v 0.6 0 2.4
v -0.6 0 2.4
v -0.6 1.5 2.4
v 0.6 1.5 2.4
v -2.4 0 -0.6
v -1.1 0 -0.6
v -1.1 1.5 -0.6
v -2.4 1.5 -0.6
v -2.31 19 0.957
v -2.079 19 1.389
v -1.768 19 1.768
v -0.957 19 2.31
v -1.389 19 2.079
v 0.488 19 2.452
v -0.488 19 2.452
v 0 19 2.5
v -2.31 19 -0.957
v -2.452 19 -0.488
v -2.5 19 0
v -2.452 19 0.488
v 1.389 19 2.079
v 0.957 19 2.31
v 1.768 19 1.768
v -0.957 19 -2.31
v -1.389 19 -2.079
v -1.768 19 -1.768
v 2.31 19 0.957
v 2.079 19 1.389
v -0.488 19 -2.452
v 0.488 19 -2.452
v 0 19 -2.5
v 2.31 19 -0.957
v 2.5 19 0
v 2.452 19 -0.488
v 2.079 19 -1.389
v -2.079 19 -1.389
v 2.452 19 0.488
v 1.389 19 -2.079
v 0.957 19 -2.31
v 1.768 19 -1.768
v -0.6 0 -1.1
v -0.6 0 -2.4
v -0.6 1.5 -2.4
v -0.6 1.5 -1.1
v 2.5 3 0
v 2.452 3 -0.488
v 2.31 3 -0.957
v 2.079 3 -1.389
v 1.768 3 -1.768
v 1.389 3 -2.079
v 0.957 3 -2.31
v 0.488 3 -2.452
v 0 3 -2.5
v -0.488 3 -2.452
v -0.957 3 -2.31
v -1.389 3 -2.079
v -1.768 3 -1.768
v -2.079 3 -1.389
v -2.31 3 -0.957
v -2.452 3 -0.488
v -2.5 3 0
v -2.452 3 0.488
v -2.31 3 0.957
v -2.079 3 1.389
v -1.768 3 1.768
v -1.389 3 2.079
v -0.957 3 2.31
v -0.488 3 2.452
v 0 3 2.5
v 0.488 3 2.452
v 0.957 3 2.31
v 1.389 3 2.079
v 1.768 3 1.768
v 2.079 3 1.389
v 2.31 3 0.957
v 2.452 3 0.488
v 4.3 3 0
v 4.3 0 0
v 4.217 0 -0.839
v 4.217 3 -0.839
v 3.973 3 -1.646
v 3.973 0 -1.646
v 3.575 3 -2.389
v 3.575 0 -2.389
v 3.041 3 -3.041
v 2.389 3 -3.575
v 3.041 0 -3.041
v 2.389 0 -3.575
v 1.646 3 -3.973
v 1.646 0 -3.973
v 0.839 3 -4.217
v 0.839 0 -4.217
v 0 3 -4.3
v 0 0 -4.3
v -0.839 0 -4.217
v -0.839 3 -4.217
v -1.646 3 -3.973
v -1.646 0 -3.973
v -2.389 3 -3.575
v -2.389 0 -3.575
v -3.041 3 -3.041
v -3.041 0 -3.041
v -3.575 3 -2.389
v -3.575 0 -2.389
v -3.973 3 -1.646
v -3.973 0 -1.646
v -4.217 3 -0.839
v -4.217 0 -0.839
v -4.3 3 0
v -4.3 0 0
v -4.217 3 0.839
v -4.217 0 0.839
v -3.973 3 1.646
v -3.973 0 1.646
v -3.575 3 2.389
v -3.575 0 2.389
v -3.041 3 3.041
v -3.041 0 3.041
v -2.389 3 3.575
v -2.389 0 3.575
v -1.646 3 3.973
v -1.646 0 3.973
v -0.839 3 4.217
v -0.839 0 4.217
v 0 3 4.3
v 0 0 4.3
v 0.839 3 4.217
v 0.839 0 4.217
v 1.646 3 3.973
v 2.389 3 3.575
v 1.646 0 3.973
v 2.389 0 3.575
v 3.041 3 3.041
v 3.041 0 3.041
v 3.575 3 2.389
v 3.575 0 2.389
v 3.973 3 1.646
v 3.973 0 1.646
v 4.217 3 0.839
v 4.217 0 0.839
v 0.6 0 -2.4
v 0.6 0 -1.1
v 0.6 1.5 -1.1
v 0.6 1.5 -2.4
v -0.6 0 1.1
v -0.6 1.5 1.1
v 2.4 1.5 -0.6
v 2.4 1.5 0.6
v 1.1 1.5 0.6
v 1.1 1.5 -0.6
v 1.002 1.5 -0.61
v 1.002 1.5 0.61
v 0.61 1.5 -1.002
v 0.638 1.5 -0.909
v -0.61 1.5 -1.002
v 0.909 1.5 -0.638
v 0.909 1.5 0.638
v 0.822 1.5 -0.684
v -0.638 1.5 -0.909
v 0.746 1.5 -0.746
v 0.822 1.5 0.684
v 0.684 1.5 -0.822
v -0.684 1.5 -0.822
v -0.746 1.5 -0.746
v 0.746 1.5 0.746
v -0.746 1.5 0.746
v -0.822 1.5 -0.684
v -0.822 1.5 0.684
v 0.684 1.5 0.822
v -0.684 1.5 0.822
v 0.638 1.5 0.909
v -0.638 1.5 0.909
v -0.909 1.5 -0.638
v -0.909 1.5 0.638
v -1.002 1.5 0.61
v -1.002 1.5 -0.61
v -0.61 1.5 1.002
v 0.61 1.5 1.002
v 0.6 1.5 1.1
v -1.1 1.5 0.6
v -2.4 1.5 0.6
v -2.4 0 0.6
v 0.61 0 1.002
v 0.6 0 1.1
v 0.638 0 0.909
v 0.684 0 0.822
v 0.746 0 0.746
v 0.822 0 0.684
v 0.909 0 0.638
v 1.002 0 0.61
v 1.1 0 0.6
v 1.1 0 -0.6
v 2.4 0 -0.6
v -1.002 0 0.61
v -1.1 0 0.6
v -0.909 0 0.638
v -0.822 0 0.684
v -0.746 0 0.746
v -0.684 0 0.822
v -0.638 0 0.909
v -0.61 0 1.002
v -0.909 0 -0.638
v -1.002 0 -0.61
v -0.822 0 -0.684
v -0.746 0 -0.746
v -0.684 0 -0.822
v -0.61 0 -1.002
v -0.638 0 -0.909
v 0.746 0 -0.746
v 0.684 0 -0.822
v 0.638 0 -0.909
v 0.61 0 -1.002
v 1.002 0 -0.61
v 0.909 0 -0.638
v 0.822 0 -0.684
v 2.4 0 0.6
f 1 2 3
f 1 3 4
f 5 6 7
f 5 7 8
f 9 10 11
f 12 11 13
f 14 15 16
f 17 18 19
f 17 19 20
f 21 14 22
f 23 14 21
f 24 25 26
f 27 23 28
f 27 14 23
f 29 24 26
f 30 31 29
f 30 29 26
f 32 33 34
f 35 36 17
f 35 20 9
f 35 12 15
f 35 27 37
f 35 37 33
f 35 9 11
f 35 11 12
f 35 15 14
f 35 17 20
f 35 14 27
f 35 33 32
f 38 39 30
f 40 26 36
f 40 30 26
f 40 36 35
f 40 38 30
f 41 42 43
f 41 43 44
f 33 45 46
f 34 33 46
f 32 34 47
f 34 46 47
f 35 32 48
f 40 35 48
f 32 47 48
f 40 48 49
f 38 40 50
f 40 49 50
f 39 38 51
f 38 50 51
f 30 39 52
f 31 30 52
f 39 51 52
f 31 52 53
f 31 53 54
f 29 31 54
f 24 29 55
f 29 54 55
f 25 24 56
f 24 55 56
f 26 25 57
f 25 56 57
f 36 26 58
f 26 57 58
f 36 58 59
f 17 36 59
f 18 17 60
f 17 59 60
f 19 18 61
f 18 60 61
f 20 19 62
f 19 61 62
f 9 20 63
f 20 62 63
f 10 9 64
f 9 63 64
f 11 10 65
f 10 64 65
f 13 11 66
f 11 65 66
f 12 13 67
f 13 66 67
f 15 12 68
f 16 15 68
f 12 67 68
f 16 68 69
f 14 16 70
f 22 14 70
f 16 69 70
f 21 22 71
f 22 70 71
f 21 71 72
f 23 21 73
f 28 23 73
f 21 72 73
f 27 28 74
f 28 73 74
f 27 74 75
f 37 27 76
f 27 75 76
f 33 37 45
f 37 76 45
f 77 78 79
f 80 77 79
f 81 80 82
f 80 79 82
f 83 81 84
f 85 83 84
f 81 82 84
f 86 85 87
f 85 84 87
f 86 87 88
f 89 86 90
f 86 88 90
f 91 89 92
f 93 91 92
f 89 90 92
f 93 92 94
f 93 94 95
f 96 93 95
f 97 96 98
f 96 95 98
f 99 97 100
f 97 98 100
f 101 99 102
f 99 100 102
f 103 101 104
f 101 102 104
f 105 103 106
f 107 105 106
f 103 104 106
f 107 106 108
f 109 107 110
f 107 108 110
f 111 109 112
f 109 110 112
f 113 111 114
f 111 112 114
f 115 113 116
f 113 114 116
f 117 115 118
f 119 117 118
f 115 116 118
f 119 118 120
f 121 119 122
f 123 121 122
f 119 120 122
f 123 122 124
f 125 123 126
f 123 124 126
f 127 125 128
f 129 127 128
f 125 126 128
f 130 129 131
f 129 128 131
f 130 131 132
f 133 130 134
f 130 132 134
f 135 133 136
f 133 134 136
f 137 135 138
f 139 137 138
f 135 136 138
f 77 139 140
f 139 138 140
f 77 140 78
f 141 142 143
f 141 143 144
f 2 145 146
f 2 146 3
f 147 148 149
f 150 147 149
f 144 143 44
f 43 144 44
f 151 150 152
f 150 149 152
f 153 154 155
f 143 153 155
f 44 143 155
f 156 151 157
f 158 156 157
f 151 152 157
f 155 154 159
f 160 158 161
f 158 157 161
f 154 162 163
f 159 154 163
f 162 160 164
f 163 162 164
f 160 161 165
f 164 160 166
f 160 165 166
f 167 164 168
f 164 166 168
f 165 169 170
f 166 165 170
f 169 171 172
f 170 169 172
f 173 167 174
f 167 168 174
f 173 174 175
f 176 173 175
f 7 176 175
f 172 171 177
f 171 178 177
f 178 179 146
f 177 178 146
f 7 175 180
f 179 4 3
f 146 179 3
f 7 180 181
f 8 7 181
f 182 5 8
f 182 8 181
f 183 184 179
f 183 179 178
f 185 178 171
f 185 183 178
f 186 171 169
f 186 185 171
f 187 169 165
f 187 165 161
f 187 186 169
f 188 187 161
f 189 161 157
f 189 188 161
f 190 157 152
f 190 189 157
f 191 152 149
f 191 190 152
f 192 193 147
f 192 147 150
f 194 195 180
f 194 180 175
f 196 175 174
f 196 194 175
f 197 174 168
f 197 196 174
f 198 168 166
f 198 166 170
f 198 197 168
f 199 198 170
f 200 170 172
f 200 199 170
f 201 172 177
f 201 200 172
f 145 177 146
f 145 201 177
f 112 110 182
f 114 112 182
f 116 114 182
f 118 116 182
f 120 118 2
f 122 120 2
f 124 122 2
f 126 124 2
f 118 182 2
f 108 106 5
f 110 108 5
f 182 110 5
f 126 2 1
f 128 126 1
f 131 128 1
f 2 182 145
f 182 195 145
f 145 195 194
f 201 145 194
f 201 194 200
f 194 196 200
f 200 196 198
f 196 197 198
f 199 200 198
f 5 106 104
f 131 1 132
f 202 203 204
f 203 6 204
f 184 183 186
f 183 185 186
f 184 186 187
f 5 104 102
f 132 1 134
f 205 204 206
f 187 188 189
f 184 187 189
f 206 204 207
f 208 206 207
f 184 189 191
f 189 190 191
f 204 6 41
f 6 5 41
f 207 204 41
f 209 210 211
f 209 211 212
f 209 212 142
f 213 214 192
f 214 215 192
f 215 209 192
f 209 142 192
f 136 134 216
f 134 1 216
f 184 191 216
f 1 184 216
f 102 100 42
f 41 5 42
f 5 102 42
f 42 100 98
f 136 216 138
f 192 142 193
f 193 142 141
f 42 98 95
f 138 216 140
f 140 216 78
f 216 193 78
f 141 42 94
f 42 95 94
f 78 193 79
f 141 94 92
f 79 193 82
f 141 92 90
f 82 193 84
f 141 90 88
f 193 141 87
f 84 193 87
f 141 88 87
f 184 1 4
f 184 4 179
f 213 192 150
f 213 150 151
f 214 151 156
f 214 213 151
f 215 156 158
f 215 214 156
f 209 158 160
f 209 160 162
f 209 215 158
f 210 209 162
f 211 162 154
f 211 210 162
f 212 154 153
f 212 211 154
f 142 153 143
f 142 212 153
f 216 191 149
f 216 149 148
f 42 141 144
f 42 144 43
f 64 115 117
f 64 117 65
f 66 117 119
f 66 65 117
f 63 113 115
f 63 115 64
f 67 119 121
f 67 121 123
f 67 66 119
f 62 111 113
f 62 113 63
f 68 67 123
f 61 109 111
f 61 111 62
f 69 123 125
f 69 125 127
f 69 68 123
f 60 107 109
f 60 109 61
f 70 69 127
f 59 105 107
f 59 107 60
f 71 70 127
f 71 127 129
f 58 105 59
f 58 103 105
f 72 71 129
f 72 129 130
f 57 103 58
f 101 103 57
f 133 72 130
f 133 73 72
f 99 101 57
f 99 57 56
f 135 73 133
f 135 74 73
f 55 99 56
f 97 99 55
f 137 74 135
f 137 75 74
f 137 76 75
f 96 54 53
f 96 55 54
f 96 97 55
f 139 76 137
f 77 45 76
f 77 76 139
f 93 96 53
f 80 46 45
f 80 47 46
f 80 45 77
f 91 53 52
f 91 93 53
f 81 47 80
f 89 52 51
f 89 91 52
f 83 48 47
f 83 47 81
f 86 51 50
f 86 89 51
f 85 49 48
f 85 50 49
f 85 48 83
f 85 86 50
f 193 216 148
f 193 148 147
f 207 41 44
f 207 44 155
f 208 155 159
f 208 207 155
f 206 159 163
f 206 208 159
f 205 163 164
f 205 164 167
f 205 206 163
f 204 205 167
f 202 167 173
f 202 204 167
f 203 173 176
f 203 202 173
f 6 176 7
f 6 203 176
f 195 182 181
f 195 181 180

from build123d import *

# Parameters (mm, degrees)
SKETCH_1_R          = 4.3
EXTRUDE_1_DEPTH     = 3
SKETCH_2_R          = 2.5
EXTRUDE_2_DEPTH     = 16
CUT_EXTRUDE_1_DEPTH = 1.5


with BuildPart() as part:
    # 草图1 → 凸台-拉伸1 (new body)
    with BuildSketch(Plane(origin=(0, 0, 0), x_dir=(1, 0, 0), z_dir=(0, 1, 0))):
        Circle(SKETCH_1_R)
    extrude(amount=EXTRUDE_1_DEPTH)

    # 草图2 → 凸台-拉伸2 (add)
    with BuildSketch(Plane(origin=(0, 3, 0), x_dir=(1, 0, 0), z_dir=(0, 1, 0))):
        Circle(SKETCH_2_R)
    extrude(amount=EXTRUDE_2_DEPTH)

    # 草图3 → 切除-拉伸1 (cut)
    with BuildSketch(Plane.XZ):
        with BuildLine():
            Line((-0.6, 1.1), (-0.6, 2.4))
            Line((-0.6, 2.4), (0.6, 2.4))
            Line((0.6, 2.4), (0.6, 1.1))
            ThreePointArc((0.6, 1.1), (0.746446609, 0.746446609), (1.1, 0.6))
            Line((1.1, 0.6), (2.4, 0.6))
            Line((2.4, 0.6), (2.4, -0.6))
            Line((2.4, -0.6), (1.1, -0.6))
            ThreePointArc((1.1, -0.6), (0.746446609, -0.746446609), (0.6, -1.1))
            Line((0.6, -1.1), (0.6, -2.4))
            Line((0.6, -2.4), (-0.6, -2.4))
            Line((-0.6, -2.4), (-0.6, -1.1))
            ThreePointArc((-0.6, -1.1), (-0.746446609, -0.746446609), (-1.1, -0.6))
            Line((-1.1, -0.6), (-2.4, -0.6))
            Line((-2.4, -0.6), (-2.4, 0.6))
            Line((-2.4, 0.6), (-1.1, 0.6))
            ThreePointArc((-1.1, 0.6), (-0.746446609, 0.746446609), (-0.6, 1.1))
        make_face()
    extrude(amount=-CUT_EXTRUDE_1_DEPTH, mode=Mode.SUBTRACT)


solid = part.part
